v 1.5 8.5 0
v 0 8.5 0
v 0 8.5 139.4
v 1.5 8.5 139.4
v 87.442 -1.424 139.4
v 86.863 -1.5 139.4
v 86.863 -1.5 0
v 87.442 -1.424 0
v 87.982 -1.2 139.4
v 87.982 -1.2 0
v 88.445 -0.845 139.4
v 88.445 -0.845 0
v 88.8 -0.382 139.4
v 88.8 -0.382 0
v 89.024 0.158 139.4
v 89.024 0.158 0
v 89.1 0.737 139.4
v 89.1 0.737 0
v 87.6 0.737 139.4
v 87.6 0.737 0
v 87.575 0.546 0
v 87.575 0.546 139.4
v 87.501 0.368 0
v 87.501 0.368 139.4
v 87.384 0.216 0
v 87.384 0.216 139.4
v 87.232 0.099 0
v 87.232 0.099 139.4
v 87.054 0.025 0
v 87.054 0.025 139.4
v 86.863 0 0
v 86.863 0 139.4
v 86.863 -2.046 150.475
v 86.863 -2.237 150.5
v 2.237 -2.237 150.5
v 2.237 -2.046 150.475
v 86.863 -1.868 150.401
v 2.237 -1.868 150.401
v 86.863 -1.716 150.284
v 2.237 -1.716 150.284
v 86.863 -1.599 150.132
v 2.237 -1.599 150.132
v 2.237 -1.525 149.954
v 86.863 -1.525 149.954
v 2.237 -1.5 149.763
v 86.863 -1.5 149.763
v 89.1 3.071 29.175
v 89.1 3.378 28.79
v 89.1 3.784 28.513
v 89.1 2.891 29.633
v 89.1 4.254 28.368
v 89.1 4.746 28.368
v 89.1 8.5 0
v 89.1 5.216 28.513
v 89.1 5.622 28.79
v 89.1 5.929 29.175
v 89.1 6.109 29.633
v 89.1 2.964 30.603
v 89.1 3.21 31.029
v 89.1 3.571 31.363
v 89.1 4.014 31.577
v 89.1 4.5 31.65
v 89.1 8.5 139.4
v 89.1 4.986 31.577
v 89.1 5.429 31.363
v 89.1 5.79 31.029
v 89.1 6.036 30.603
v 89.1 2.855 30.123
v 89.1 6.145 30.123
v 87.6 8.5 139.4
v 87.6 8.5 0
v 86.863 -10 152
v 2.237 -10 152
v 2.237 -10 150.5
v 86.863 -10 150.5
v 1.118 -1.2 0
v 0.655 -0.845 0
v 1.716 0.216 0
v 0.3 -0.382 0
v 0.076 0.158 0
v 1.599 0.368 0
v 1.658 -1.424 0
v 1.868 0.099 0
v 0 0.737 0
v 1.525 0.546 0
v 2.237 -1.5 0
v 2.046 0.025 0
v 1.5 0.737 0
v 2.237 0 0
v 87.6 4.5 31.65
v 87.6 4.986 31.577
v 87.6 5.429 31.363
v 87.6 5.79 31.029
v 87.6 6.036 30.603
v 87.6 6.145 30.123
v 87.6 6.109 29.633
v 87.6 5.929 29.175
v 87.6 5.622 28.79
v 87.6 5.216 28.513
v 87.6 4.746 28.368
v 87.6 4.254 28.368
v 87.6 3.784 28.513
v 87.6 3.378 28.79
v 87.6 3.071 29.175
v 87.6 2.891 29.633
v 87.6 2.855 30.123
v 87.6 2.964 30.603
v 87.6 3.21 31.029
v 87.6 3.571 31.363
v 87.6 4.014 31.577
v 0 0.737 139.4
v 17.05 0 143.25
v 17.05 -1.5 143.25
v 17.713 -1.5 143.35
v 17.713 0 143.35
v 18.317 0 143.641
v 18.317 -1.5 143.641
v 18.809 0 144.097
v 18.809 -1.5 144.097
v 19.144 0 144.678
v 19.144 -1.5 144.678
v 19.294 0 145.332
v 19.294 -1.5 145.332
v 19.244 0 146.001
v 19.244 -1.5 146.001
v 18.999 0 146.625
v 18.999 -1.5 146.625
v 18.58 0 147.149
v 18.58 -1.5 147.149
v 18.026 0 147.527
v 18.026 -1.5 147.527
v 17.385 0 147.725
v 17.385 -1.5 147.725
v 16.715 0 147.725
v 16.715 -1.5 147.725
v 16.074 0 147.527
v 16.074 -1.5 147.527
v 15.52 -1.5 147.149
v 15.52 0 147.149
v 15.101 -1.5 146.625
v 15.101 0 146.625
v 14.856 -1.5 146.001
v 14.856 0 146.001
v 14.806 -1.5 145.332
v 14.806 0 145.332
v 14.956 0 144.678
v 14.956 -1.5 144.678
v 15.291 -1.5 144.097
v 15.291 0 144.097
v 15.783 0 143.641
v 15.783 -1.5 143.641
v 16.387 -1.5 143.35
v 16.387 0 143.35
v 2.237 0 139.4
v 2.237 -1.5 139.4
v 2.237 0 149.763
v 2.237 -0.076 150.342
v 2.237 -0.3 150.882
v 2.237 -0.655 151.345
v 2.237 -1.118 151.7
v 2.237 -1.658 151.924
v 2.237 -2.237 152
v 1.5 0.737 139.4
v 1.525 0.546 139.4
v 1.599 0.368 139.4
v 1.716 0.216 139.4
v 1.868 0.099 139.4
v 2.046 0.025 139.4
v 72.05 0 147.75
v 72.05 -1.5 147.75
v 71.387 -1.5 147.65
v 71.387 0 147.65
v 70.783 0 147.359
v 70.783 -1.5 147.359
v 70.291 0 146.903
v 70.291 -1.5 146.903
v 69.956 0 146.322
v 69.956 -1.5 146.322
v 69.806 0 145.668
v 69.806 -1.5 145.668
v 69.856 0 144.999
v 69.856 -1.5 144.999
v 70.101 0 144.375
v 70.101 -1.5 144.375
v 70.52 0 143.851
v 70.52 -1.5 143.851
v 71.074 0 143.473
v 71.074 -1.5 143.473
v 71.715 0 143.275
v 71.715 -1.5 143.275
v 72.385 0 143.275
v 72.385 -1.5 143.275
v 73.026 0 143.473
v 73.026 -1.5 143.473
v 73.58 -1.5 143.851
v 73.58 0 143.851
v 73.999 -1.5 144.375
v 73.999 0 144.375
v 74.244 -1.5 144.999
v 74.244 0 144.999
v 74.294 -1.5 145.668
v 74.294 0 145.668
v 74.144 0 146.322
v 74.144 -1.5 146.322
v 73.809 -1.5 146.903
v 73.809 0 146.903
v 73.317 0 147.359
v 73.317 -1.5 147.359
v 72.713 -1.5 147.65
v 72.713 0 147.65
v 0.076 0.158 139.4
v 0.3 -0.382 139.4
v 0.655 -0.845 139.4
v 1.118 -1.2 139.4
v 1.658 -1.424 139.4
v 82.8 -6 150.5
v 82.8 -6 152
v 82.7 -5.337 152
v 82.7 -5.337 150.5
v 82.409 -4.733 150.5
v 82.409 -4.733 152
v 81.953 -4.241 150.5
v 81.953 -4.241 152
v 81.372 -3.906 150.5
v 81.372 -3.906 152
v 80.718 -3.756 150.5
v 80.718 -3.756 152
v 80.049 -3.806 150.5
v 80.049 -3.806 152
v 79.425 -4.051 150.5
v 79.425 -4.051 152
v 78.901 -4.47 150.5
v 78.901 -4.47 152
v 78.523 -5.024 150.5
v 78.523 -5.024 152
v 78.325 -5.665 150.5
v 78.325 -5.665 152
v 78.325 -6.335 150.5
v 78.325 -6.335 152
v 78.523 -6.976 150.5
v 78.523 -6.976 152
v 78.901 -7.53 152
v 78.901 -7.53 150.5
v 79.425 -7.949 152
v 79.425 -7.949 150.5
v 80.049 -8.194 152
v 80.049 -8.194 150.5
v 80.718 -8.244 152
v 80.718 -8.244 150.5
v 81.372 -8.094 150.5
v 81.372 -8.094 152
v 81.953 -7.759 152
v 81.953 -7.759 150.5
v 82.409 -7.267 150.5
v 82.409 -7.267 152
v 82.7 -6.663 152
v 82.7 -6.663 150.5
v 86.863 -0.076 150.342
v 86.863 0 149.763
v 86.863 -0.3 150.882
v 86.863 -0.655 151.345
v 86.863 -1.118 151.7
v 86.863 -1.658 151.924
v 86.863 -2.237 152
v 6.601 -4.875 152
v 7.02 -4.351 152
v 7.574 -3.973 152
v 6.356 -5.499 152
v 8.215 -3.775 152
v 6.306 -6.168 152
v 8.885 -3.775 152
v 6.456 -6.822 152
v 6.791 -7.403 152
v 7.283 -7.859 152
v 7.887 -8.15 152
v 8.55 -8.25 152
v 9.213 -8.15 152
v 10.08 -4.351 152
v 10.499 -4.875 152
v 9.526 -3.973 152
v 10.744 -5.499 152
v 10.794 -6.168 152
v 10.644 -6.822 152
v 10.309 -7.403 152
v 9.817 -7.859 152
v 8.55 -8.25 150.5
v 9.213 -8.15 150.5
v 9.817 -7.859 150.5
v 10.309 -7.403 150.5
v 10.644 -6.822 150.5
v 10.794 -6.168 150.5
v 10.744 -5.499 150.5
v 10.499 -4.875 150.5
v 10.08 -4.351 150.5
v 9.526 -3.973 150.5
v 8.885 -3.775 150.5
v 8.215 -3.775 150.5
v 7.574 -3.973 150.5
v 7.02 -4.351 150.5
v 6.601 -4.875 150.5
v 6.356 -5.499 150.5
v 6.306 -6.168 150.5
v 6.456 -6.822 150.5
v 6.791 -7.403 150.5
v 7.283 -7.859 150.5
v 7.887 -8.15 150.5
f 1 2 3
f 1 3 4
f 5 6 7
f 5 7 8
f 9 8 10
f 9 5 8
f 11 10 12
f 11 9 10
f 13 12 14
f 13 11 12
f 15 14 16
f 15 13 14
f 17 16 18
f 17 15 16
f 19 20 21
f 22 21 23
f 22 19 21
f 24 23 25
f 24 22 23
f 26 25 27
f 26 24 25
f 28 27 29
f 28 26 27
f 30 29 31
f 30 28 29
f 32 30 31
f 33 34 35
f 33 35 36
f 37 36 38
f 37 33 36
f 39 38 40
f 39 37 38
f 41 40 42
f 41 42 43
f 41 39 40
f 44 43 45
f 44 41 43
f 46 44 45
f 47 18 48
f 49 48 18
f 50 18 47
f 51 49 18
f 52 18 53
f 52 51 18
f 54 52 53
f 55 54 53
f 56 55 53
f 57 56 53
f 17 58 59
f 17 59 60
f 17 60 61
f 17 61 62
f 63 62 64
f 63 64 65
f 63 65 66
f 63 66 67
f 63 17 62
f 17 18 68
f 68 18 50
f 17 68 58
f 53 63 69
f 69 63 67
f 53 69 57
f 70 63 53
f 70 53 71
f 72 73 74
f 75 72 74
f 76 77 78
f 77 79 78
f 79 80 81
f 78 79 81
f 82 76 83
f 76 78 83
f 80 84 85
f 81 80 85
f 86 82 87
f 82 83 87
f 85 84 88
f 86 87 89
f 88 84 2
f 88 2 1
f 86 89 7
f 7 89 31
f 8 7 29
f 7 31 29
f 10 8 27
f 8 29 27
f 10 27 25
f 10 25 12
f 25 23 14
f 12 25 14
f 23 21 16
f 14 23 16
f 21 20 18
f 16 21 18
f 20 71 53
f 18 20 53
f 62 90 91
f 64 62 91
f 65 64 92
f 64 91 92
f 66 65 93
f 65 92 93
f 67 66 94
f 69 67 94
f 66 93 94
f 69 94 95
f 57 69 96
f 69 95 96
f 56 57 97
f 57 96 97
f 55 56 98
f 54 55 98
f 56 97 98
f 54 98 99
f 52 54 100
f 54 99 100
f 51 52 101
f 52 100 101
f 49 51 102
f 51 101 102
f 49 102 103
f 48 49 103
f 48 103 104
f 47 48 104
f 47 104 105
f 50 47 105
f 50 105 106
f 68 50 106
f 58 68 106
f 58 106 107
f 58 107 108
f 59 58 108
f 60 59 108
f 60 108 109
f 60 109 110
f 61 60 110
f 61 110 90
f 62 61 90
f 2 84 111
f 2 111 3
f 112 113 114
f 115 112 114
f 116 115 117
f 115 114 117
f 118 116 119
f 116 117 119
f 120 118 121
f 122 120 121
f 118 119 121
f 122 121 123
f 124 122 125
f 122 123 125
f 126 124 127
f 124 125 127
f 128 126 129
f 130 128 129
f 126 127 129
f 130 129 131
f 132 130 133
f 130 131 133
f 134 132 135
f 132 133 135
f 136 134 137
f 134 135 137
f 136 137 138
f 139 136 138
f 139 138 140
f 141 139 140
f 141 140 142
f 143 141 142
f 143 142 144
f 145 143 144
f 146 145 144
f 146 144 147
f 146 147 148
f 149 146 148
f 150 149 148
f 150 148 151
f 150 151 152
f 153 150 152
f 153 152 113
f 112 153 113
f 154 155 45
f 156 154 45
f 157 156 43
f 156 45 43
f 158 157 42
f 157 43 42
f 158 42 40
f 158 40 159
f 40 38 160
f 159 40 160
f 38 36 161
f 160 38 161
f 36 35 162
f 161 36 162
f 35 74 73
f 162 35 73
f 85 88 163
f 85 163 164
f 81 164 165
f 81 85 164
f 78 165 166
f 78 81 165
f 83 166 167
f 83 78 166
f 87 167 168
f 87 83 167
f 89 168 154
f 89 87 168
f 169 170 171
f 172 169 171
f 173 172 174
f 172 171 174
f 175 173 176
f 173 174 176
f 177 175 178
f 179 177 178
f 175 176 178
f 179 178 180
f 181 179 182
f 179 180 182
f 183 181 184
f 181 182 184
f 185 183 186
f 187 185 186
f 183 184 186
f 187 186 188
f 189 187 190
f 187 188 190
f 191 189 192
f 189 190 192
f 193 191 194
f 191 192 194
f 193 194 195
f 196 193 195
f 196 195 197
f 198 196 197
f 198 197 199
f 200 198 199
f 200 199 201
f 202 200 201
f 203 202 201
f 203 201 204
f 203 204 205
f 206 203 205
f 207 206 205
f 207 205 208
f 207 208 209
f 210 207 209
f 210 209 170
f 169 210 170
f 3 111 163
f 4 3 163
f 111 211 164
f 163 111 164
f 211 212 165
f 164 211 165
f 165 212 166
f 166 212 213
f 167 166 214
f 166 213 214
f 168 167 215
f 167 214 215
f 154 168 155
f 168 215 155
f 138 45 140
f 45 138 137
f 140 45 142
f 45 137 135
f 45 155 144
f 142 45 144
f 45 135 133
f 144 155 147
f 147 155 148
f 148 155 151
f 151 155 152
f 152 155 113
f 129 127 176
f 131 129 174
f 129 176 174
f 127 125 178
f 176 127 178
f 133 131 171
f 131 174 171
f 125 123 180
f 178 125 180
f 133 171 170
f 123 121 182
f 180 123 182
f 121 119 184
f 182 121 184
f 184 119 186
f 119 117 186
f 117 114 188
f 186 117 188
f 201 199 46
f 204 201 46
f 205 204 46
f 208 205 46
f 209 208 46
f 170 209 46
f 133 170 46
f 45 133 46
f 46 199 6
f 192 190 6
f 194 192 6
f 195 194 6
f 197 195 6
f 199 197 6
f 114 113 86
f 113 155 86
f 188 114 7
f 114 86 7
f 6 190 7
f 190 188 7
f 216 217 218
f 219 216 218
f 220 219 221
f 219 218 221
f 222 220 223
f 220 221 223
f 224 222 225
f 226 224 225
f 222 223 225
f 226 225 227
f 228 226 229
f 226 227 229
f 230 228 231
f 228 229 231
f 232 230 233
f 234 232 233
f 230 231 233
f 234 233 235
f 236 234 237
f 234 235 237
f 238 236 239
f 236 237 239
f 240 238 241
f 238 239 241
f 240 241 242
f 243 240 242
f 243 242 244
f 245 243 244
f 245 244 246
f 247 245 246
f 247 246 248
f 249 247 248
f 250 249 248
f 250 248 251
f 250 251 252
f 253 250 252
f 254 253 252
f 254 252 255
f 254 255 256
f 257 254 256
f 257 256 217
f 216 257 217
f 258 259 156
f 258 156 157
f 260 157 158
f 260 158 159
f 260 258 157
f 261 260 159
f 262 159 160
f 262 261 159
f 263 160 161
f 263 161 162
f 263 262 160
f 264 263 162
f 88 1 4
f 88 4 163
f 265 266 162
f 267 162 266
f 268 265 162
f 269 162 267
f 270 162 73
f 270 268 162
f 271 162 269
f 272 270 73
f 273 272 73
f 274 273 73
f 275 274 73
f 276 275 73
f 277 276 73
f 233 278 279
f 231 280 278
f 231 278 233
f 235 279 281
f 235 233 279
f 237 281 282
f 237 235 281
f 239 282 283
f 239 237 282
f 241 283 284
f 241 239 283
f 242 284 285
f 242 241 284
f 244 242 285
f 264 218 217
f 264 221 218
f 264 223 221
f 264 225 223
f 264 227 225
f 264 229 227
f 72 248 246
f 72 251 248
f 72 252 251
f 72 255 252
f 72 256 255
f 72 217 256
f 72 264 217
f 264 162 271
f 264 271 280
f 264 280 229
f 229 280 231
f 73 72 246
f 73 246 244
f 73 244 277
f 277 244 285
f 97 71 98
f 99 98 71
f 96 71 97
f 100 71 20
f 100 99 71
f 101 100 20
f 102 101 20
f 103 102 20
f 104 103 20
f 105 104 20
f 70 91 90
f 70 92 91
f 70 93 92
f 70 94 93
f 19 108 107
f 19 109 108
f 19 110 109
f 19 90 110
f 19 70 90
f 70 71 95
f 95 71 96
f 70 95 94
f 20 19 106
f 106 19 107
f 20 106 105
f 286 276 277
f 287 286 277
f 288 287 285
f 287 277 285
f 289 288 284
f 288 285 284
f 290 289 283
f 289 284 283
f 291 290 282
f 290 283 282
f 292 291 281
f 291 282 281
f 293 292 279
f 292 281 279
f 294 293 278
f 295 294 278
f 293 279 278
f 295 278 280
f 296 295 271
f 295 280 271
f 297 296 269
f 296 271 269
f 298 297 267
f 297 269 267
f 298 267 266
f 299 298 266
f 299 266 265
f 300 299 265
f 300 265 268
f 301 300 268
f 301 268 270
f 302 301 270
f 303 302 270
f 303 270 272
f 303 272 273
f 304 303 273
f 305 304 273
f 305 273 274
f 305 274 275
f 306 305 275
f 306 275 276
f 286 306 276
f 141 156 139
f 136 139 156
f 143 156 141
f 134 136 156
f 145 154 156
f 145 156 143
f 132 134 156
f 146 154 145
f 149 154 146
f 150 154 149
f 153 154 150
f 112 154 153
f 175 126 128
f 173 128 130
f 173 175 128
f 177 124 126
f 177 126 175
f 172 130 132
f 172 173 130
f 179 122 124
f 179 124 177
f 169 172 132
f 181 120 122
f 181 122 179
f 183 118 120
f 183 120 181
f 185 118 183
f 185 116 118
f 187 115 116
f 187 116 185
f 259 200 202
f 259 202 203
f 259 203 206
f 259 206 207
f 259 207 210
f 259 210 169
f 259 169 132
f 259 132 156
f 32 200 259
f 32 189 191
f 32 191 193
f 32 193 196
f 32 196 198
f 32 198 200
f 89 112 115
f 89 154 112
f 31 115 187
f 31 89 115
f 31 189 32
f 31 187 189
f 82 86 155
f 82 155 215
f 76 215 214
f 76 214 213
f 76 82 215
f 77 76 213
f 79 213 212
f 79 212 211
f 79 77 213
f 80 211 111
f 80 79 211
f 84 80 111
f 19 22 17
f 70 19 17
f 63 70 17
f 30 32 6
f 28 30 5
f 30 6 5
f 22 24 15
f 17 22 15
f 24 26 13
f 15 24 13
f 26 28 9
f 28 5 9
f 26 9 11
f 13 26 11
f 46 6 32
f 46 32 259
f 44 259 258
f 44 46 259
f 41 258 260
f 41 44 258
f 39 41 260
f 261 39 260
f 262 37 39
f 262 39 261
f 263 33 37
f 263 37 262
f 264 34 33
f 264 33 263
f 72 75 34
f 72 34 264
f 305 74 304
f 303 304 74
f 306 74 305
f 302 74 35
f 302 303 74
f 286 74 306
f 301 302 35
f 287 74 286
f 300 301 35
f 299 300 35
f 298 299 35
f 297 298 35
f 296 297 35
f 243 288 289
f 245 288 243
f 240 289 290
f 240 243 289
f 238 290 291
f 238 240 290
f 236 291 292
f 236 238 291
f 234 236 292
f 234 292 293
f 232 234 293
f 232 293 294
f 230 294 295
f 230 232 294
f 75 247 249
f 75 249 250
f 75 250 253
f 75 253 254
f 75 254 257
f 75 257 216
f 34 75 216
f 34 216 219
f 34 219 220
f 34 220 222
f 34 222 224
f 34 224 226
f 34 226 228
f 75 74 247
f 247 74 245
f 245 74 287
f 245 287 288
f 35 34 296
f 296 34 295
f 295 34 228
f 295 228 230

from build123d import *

# Parameters (mm, degrees)
SKETCH_2_W                       = 89.1
SKETCH_2_H                       = 1.5
SM_BASE_FLANGE_1_DEPTH           = 152
SM_EDGE_FLANGE_1_STRIP_W         = 7.4732
SM_EDGE_FLANGE_1_STRIP_H         = 1.5
SM_EDGE_FLANGE_1_STRIP_CUT_DEPTH = 152
SM_EDGE_FLANGE_1_DEPTH           = 152
SM_EDGE_FLANGE_2_STRIP_W         = 7.4732
SM_EDGE_FLANGE_2_STRIP_H         = 1.5
SM_EDGE_FLANGE_2_STRIP_CUT_DEPTH = 152
SM_EDGE_FLANGE_2_DEPTH           = 152
SKETCH_13_W                      = 16.114616681
SKETCH_13_H                      = 12.6
SKETCH_13_W_2                    = 14.895249376
CUT_EXTRUDE_1_DEPTH              = 177.473255764
SM_EDGE_FLANGE_3_STRIP_W         = 7.4732
SM_EDGE_FLANGE_3_STRIP_H         = 1.5
SM_EDGE_FLANGE_3_STRIP_CUT_DEPTH = 84.6268
SM_EDGE_FLANGE_3_DEPTH           = 84.6268
SKETCH_17_R                      = 2.25
CUT_EXTRUDE_2_DEPTH              = 10
SKETCH_18_R                      = 2.25
CUT_EXTRUDE_3_DEPTH              = 10
HOLE_WIZARD_M4_1_D               = 3.3
HOLE_WIZARD_M4_1_DEPTH           = 10.1
HOLE_WIZARD_M4_1_TIP             = 0.991420021


# Sheet-metal steps are written as plain solids
with BuildPart() as part:
    # Sketch 2 → 基体-法兰1 (new body)
    with BuildSketch(Plane.XY):
        with Locations((44.55, -0.75)):
            Rectangle(SKETCH_2_W, SKETCH_2_H)
    extrude(amount=SM_BASE_FLANGE_1_DEPTH)

    # 边线-法兰1 strip (across the edge) → 边线-法兰1 strip cut (cut)
    with BuildSketch(Plane.XY):
        with Locations((-1.5, -0.75)):
            Rectangle(SM_EDGE_FLANGE_1_STRIP_W, SM_EDGE_FLANGE_1_STRIP_H)
    extrude(amount=SM_EDGE_FLANGE_1_STRIP_CUT_DEPTH, mode=Mode.SUBTRACT)

    # 边线-法兰1 section (across the edge) → 边线-法兰1 (add)
    with BuildSketch(Plane.XY):
        with BuildLine():
            Line((0, 0.7366), (0, 8.5))
            Line((0, 8.5), (1.5, 8.5))
            Line((1.5, 8.5), (1.5, 0.7366))
            ThreePointArc((1.5, 0.7366), (1.715745145, 0.215745145), (2.2366, 0))
            Line((2.2366, 0), (2.2366, -1.5))
            ThreePointArc((2.2366, -1.5), (0.655084973, -0.844915027), (0, 0.7366))
        make_face()
    extrude(amount=SM_EDGE_FLANGE_1_DEPTH)

    # 边线-法兰2 strip (across the edge) → 边线-法兰2 strip cut (cut)
    with BuildSketch(Plane(origin=(89.1, 0, 152), x_dir=(-1, 0, 0), z_dir=(0, 0, -1))):
        with Locations((-1.5, -0.75)):
            Rectangle(SM_EDGE_FLANGE_2_STRIP_W, SM_EDGE_FLANGE_2_STRIP_H)
    extrude(amount=SM_EDGE_FLANGE_2_STRIP_CUT_DEPTH, mode=Mode.SUBTRACT)

    # 边线-法兰2 section (across the edge) → 边线-法兰2 (add)
    with BuildSketch(Plane(origin=(89.1, 0, 152), x_dir=(-1, 0, 0), z_dir=(0, 0, -1))):
        with BuildLine():
            Line((0, 0.7366), (0, 8.5))
            Line((0, 8.5), (1.5, 8.5))
            Line((1.5, 8.5), (1.5, 0.7366))
            ThreePointArc((1.5, 0.7366), (1.715745145, 0.215745145), (2.2366, 0))
            Line((2.2366, 0), (2.2366, -1.5))
            ThreePointArc((2.2366, -1.5), (0.655084973, -0.844915027), (0, 0.7366))
        make_face()
    extrude(amount=SM_EDGE_FLANGE_2_DEPTH)

    # 草图13 → 切除-拉伸1 (cut, through all)
    with BuildSketch(Plane.XZ.offset(1.5)):
        with Locations((-5.82070834, 145.7)):
            Rectangle(SKETCH_13_W, SKETCH_13_H)
        with Locations((94.311024688, 145.7)):
            Rectangle(SKETCH_13_W_2, SKETCH_13_H)
    extrude(amount=-CUT_EXTRUDE_1_DEPTH, mode=Mode.SUBTRACT)

    # 边线-法兰3 strip (across the edge) → 边线-法兰3 strip cut (cut)
    with BuildSketch(Plane(origin=(86.8634, -1.5, 152), x_dir=(0, 0, -1), z_dir=(-1, 0, 0))):
        with Locations((-1.5, -0.75)):
            Rectangle(SM_EDGE_FLANGE_3_STRIP_W, SM_EDGE_FLANGE_3_STRIP_H)
    extrude(amount=SM_EDGE_FLANGE_3_STRIP_CUT_DEPTH, mode=Mode.SUBTRACT)

    # 边线-法兰3 section (across the edge) → 边线-法兰3 (add)
    with BuildSketch(Plane(origin=(86.8634, -1.5, 152), x_dir=(0, 0, -1), z_dir=(-1, 0, 0))):
        with BuildLine():
            Line((0, 0.7366), (0, 8.5))
            Line((0, 8.5), (1.5, 8.5))
            Line((1.5, 8.5), (1.5, 0.7366))
            ThreePointArc((1.5, 0.7366), (1.715745145, 0.215745145), (2.2366, 0))
            Line((2.2366, 0), (2.2366, -1.5))
            ThreePointArc((2.2366, -1.5), (0.655084973, -0.844915027), (0, 0.7366))
        make_face()
    extrude(amount=SM_EDGE_FLANGE_3_DEPTH)

    # 草图17 → 切除-拉伸2 (cut)
    with BuildSketch(Plane.XY.offset(152)):
        with Locations((80.55, -6)):
            Circle(SKETCH_17_R)
        with Locations(Location((8.55, -6, 0), (0, 0, 270))):
            Circle(SKETCH_17_R)
    extrude(amount=-CUT_EXTRUDE_2_DEPTH, mode=Mode.SUBTRACT)

    # 草图18 → 切除-拉伸3 (cut)
    with BuildSketch(Plane.XZ.offset(1.5)):
        with Locations(Location((17.05, 145.5, 0), (0, 0, 270))):
            Circle(SKETCH_18_R)
        with Locations(Location((72.05, 145.5, 0), (0, 0, 90))):
            Circle(SKETCH_18_R)
    extrude(amount=-CUT_EXTRUDE_3_DEPTH, mode=Mode.SUBTRACT)

    # M4 螺纹孔1
    with Locations(Plane(origin=(89.1, 0, 0), x_dir=(0, 0, -1), z_dir=(1, 0, 0))):
        with Locations((-30, 4.5)):
            Hole(HOLE_WIZARD_M4_1_D / 2, depth=HOLE_WIZARD_M4_1_DEPTH)
            with Locations((0, 0, -(HOLE_WIZARD_M4_1_DEPTH + HOLE_WIZARD_M4_1_TIP / 2))):  # 118° drill point
                Cone(0, HOLE_WIZARD_M4_1_D / 2, HOLE_WIZARD_M4_1_TIP, mode=Mode.SUBTRACT)


solid = part.part
